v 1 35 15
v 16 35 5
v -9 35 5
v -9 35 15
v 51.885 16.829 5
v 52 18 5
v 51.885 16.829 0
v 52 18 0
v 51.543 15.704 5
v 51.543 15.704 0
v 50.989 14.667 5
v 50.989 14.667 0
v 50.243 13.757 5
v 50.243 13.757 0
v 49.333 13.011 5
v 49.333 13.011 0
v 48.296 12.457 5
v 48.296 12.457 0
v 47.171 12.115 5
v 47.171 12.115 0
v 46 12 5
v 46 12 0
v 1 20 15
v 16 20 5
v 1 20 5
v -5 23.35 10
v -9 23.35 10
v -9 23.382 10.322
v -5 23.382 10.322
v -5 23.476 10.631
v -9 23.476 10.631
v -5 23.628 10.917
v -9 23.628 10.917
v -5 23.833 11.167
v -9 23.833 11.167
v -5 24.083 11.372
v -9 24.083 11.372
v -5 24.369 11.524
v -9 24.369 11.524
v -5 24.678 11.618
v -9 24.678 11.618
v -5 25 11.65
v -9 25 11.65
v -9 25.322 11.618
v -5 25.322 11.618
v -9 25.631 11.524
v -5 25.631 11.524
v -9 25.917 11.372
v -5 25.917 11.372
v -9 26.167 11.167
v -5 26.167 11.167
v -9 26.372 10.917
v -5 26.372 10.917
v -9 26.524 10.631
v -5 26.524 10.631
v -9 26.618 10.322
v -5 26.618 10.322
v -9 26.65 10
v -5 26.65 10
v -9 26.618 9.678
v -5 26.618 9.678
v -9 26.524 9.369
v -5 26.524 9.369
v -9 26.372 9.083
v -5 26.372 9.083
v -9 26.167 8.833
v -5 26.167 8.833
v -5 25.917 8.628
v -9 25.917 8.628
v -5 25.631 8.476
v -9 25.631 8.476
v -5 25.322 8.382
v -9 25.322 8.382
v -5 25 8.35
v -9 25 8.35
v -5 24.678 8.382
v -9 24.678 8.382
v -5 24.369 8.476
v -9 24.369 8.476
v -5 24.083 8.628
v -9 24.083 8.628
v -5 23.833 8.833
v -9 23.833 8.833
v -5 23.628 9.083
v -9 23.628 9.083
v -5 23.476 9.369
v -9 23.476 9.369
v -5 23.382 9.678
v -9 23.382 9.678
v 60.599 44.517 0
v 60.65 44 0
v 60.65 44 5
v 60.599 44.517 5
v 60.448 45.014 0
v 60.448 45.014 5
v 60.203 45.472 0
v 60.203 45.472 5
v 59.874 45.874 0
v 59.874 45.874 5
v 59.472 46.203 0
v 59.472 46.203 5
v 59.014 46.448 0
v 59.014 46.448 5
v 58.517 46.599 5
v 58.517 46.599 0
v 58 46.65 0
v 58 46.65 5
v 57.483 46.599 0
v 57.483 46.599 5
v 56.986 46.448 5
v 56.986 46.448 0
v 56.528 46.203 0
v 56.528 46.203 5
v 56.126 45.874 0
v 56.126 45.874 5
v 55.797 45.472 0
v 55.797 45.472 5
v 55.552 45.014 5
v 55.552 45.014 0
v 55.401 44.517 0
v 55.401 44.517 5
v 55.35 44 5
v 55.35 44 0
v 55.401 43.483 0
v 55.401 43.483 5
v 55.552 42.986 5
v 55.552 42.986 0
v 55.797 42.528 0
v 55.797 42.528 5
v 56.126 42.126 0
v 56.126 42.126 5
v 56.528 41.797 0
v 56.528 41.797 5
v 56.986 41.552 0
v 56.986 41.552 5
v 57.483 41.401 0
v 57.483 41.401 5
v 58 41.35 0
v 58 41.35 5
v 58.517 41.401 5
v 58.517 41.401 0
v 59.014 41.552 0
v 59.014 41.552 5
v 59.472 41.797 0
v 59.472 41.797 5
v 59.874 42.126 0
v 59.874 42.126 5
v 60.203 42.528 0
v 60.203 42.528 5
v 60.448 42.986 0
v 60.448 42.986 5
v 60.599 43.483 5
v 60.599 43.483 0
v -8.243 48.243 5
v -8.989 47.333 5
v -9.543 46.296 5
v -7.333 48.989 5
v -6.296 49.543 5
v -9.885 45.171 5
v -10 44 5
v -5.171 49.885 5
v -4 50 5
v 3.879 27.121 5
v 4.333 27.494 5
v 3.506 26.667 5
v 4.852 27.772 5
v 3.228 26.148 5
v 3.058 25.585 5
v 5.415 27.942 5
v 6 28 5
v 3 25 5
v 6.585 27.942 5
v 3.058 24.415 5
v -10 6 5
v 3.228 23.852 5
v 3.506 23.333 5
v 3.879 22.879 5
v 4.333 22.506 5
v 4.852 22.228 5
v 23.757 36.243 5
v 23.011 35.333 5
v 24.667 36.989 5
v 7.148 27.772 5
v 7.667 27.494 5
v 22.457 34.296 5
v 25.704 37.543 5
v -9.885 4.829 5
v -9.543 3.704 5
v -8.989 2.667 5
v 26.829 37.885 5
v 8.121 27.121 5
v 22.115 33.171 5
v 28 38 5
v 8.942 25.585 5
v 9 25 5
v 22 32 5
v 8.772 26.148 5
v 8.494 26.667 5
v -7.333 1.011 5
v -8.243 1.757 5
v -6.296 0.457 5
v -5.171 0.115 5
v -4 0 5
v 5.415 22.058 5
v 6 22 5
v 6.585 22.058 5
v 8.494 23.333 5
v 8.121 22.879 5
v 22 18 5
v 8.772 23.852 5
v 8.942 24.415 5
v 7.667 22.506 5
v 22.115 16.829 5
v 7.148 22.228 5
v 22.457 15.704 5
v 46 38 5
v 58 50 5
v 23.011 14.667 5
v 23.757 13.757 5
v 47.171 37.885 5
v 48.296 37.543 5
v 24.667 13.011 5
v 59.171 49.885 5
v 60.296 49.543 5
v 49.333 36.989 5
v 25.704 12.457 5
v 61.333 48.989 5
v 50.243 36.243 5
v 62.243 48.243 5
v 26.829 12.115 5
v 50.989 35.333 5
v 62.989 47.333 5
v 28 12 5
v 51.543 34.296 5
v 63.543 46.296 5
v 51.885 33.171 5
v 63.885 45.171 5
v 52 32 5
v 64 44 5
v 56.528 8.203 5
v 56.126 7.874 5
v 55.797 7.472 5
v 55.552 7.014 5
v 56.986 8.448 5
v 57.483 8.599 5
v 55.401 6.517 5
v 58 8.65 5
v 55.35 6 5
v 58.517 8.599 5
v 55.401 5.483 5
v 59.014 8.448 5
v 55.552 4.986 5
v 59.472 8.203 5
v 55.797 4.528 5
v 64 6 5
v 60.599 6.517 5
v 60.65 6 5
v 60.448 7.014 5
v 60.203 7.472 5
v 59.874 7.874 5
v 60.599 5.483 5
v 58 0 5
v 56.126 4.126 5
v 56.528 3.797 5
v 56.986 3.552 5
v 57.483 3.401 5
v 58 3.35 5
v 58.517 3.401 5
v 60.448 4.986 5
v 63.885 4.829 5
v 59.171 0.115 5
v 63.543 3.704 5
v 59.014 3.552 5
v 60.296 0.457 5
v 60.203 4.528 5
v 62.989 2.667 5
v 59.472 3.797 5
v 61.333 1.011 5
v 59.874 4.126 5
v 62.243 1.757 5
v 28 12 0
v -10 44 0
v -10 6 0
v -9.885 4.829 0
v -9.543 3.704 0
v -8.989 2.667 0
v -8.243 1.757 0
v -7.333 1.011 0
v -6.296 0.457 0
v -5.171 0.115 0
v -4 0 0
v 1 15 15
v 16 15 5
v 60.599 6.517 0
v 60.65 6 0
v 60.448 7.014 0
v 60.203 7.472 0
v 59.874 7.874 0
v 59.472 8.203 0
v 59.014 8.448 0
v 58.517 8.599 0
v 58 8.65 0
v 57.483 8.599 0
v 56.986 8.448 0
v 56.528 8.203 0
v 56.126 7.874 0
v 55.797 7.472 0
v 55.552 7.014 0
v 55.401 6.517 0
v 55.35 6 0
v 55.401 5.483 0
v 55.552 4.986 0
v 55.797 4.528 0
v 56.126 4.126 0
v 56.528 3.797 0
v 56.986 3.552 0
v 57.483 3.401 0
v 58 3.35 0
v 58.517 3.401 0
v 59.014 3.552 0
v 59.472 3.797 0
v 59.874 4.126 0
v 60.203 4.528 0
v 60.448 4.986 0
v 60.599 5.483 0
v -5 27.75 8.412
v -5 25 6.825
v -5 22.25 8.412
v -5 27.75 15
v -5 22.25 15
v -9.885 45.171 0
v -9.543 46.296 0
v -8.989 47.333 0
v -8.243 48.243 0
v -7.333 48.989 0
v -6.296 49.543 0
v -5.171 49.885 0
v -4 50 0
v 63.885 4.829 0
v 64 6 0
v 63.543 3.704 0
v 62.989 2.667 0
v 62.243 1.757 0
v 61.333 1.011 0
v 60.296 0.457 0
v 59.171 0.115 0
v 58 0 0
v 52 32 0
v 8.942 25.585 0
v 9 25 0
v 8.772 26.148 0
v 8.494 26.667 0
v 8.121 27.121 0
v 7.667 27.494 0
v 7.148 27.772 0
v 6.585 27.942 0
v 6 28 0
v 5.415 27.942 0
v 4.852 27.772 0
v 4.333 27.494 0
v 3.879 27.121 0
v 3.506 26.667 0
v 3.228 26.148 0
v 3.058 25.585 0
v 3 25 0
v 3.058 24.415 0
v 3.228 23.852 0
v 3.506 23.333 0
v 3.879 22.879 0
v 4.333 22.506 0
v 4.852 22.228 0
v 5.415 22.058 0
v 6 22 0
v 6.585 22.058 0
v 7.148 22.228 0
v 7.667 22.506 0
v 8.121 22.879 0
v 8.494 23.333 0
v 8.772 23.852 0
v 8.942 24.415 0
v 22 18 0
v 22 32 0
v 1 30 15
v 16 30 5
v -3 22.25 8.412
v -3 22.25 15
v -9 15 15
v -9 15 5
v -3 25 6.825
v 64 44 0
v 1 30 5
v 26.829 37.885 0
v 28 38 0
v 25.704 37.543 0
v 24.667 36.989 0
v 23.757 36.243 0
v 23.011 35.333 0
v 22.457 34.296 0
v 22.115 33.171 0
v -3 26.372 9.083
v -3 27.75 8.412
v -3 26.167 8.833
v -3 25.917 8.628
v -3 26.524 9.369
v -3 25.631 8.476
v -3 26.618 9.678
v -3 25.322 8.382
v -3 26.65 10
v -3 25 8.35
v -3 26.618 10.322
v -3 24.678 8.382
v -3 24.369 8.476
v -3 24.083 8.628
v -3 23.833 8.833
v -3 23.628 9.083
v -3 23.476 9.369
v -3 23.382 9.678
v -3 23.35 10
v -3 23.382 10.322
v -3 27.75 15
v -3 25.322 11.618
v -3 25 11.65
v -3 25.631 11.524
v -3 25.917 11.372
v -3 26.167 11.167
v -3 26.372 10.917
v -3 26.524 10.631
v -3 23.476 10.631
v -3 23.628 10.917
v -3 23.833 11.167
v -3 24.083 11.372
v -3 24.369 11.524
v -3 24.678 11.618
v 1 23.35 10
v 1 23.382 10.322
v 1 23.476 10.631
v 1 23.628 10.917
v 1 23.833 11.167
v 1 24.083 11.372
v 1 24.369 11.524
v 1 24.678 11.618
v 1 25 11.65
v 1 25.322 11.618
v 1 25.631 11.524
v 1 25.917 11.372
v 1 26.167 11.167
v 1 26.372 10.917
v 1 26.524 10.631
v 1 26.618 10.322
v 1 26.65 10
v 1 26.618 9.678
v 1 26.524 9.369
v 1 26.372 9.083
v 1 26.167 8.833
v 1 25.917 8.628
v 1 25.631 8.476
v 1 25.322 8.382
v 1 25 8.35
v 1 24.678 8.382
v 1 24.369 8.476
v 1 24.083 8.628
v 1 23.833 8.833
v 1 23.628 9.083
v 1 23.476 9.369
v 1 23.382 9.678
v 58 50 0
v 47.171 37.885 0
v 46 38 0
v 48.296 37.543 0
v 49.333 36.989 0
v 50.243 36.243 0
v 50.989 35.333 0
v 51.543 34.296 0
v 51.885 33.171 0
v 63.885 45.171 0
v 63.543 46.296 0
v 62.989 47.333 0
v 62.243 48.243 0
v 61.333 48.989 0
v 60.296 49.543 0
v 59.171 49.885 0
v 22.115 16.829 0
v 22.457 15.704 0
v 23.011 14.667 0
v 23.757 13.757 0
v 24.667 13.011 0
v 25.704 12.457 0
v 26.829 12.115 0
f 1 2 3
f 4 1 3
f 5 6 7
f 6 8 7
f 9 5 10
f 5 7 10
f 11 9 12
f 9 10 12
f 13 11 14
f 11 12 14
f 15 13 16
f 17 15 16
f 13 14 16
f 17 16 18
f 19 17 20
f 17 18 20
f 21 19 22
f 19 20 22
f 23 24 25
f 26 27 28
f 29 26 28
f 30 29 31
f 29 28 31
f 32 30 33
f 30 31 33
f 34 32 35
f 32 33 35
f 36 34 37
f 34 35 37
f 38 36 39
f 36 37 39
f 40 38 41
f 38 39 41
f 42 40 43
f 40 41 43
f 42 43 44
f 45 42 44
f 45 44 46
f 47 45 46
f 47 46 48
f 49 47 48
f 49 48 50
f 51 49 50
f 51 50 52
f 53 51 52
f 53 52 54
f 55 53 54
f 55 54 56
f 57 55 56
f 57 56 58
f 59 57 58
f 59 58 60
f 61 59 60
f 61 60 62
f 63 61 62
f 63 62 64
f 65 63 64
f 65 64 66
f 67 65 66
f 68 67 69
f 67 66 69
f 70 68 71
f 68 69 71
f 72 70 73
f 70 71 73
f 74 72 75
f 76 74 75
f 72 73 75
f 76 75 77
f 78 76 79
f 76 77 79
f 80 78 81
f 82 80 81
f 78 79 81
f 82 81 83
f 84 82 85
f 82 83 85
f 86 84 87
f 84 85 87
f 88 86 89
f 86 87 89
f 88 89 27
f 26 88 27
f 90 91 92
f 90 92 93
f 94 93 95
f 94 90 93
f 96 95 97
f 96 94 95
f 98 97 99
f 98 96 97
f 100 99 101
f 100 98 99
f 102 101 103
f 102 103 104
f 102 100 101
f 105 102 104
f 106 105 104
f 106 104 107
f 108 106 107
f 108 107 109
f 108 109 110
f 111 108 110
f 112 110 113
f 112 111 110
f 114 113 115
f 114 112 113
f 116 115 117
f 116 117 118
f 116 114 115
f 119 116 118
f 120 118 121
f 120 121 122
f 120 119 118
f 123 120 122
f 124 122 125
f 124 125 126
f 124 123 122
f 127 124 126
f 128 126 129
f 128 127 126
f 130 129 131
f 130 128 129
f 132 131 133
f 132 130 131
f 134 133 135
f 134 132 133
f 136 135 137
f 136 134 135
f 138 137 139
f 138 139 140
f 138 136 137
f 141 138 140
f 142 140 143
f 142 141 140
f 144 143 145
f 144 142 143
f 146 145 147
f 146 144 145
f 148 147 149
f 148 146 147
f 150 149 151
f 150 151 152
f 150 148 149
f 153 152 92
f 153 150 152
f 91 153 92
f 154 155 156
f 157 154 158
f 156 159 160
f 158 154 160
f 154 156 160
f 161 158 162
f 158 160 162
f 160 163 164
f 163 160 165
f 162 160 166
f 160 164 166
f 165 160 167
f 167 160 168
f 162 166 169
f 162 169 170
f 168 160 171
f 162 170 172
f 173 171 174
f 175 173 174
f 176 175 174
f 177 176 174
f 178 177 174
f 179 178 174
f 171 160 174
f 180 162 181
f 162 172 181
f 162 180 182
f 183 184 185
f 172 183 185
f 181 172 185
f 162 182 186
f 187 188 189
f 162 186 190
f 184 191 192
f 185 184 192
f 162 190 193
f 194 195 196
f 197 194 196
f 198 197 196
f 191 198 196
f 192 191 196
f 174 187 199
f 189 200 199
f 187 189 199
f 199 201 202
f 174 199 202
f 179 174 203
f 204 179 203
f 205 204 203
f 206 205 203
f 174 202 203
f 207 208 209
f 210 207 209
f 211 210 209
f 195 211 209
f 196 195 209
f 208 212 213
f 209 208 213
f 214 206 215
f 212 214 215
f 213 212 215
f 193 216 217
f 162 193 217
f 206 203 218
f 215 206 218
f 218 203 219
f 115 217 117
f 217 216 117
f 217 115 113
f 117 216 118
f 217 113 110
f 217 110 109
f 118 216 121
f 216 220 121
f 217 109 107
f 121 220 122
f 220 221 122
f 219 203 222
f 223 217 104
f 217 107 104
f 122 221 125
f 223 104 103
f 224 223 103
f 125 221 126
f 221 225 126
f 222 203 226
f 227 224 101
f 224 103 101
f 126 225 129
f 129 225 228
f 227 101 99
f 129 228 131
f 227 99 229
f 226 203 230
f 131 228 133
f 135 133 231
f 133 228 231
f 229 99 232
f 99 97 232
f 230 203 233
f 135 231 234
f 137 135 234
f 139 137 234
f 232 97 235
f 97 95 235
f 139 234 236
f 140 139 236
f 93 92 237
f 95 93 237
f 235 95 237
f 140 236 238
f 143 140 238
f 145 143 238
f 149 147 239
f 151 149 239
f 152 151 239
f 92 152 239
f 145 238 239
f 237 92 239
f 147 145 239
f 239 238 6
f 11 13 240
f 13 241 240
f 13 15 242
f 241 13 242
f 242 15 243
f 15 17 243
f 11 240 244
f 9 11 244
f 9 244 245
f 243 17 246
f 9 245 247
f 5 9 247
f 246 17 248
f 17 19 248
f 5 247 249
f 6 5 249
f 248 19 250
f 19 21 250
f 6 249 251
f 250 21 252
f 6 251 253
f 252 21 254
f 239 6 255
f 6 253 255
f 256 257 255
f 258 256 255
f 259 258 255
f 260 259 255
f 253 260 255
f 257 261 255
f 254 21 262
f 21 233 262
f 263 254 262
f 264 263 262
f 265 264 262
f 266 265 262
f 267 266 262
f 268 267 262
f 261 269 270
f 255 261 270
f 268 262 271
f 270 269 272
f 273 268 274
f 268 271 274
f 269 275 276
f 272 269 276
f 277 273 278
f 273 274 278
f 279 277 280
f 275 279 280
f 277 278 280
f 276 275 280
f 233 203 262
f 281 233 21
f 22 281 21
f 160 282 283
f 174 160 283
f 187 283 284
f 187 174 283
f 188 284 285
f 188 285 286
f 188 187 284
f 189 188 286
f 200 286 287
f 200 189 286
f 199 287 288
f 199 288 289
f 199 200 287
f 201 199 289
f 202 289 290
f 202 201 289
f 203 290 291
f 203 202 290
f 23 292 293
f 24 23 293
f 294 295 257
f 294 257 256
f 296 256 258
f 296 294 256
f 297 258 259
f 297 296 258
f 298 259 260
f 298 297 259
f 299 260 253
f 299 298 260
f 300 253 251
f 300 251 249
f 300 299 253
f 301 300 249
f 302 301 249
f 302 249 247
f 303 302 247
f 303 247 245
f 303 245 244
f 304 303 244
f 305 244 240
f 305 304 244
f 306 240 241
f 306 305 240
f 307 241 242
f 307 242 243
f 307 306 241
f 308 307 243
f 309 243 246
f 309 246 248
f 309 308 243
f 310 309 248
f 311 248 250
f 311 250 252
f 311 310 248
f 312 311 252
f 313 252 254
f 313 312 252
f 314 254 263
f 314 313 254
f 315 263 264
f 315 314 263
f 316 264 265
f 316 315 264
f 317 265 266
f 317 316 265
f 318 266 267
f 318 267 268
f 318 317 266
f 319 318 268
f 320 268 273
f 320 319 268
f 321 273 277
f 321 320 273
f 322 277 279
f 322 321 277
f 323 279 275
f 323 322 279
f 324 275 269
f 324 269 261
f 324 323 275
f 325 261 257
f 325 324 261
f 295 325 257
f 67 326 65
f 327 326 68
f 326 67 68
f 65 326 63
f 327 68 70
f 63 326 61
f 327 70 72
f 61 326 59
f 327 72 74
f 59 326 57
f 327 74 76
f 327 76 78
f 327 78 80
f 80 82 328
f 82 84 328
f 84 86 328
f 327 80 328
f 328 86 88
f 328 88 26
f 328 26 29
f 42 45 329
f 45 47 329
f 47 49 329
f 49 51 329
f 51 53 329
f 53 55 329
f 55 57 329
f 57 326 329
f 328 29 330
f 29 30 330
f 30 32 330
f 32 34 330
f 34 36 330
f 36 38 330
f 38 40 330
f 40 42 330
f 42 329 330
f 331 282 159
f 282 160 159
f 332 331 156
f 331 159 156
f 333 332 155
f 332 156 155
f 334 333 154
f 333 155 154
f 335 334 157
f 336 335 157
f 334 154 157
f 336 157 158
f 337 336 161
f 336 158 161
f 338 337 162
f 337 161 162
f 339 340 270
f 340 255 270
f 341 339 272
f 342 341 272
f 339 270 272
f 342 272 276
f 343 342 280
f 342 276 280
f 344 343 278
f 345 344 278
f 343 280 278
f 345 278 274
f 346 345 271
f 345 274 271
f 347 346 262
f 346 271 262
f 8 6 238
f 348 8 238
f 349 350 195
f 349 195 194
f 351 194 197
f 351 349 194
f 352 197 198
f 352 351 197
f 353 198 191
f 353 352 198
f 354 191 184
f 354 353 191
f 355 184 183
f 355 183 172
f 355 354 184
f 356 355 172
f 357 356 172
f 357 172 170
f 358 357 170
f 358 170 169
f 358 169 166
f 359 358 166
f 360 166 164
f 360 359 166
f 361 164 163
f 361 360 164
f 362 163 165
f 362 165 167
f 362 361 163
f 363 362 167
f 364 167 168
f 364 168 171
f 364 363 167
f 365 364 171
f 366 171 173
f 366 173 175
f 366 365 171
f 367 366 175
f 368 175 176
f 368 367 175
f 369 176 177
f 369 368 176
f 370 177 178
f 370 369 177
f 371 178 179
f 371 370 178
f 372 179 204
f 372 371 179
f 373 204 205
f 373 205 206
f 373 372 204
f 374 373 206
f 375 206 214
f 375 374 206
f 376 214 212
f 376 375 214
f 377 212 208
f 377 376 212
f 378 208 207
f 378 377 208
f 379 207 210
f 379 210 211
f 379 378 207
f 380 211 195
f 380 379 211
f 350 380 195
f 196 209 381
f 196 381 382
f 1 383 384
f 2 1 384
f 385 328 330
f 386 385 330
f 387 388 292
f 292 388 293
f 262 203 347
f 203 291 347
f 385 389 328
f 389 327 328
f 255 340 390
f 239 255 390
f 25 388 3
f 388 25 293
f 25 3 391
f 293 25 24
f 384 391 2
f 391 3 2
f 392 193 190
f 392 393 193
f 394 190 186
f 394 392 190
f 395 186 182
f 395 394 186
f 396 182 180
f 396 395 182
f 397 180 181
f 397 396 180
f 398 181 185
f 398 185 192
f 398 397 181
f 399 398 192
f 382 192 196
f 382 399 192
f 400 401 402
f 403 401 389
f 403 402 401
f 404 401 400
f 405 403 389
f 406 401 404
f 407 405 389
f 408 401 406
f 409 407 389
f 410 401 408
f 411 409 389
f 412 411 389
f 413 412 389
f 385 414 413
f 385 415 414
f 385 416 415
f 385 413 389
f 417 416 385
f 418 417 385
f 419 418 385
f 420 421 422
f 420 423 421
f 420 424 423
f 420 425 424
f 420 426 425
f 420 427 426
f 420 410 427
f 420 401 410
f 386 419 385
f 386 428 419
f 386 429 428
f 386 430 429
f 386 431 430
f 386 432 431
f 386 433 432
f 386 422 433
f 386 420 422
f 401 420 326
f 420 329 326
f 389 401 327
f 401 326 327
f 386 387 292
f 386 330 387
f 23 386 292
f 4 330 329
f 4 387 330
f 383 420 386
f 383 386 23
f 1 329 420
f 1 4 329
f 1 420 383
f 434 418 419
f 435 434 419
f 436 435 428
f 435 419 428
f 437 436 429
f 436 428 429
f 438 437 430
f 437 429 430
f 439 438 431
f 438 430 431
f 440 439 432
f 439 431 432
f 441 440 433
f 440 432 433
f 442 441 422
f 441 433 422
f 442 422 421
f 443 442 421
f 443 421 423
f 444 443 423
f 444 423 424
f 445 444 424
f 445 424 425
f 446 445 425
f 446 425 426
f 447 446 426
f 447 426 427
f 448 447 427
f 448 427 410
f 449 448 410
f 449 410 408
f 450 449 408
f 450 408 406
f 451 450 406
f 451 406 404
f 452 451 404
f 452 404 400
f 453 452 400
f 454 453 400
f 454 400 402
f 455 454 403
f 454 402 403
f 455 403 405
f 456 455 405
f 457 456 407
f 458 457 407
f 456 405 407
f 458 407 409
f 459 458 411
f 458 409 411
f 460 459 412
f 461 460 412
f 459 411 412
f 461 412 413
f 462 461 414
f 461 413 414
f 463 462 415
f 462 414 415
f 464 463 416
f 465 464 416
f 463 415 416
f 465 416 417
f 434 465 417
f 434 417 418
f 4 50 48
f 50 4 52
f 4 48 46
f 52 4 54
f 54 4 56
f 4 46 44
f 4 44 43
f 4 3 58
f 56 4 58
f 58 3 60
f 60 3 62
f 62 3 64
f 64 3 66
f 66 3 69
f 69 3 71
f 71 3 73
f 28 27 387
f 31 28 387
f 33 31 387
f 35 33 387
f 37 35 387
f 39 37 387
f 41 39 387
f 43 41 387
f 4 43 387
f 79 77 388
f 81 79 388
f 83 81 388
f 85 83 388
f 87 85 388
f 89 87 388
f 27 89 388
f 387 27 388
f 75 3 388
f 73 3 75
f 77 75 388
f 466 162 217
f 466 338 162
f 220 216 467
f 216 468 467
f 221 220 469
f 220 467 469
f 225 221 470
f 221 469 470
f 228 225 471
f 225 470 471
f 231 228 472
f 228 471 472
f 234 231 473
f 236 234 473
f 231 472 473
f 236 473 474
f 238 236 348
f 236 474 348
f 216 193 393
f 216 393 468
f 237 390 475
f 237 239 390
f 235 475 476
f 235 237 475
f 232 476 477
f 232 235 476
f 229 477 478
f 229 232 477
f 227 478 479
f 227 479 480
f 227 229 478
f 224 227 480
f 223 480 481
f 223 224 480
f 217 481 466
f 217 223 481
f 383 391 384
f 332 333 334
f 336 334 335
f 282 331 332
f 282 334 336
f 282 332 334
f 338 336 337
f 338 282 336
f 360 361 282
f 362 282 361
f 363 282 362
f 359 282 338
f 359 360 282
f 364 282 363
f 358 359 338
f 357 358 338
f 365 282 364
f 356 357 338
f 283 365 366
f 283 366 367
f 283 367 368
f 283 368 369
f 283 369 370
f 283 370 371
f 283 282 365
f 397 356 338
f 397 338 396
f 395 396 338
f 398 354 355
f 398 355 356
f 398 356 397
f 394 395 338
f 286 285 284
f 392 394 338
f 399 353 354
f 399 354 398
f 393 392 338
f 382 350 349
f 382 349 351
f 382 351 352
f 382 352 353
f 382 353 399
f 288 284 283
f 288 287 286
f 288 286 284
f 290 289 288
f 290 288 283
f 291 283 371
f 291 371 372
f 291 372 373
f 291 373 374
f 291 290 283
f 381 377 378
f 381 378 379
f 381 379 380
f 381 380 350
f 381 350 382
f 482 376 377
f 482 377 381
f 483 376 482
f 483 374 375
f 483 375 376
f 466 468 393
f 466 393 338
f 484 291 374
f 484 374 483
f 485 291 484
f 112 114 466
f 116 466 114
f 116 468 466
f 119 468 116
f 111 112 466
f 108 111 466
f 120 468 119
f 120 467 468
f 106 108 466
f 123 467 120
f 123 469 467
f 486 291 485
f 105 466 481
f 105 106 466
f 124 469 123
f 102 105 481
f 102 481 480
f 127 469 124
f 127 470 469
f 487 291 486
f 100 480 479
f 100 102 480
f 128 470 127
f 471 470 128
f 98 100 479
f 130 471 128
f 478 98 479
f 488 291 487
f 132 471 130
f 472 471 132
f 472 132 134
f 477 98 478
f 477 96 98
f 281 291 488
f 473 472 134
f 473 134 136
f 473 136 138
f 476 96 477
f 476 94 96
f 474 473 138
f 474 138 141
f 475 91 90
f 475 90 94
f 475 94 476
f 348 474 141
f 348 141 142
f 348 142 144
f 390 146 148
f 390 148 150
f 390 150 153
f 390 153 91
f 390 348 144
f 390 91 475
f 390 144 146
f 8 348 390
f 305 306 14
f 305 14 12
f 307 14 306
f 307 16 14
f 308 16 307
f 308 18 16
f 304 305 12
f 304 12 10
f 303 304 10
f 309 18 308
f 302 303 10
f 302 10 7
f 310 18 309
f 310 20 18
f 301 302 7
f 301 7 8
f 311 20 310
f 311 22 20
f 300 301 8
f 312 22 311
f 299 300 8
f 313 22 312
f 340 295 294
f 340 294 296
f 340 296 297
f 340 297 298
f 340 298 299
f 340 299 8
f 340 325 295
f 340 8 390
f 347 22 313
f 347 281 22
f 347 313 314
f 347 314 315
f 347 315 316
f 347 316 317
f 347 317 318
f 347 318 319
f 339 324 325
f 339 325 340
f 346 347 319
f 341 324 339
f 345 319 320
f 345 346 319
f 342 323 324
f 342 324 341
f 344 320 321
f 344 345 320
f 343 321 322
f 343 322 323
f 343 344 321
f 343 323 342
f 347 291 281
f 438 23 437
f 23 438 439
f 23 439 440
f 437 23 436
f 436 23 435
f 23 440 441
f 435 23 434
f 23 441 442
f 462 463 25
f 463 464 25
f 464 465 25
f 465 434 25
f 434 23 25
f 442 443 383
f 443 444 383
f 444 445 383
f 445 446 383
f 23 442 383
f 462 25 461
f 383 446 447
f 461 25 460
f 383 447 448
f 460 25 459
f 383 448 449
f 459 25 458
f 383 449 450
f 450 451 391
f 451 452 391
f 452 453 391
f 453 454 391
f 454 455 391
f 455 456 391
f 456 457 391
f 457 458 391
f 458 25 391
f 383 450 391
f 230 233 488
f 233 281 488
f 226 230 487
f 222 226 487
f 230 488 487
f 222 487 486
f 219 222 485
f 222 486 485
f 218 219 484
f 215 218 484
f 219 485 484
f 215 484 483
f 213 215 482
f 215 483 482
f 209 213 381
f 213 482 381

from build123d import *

# Parameters (mm, degrees)
F0_W      = 64
F0_H      = 50
F0_R      = 2.65
F0_R_2    = 3
F1_DEPTH  = 5
F2_W      = 10
F2_H      = 50
F3_DEPTH  = 5
F8_DEPTH  = 10
F10_DEPTH = 35.001
F11_R     = 1.65
F12_DEPTH = 73.001
F15_DEPTH = 1
F16_R     = 6
F17_W     = 30
F17_H     = 26
F18_DEPTH = 5.001
F19_R     = 6


# Not quite as in the source:
# - a feature names something its author has since deleted; it is built from what else it names


with BuildPart() as f1:
    # F0 (on Top) → F1 (new body)
    with BuildSketch(Plane.XY):
        with Locations((32, 25)):
            Rectangle(F0_W, F0_H)
        with Locations((58, 6)):
            Circle(F0_R, mode=Mode.SUBTRACT)
        with Locations((6, 25)):
            Circle(F0_R_2, mode=Mode.SUBTRACT)
        with Locations((58, 44)):
            Circle(F0_R, mode=Mode.SUBTRACT)
    extrude(amount=F1_DEPTH)

    # F2 (on face) → F3 (join, through all)
    with BuildSketch(Plane(origin=(0, 0, 0), x_dir=(1, 0, 0), z_dir=(0, 0, -1))):
        with Locations((-5, -25)):
            Rectangle(F2_W, F2_H)
    extrude(amount=-F3_DEPTH)

    # F16
    f16_edges = [f1.edges().sort_by_distance(p)[0] for p in [
        (64, 50, 2.5),
        (64, 0, 2.5),
        (-10, 0, 2.5),
        (-10, 50, 2.5),
    ]]
    fillet(f16_edges, radius=F16_R)

    # F17 (on face) → F18 (cut, through all)
    with BuildSketch(Plane.XY.offset(5)):
        with Locations((37, 25)):
            Rectangle(F17_W, F17_H)
    extrude(amount=-F18_DEPTH, mode=Mode.SUBTRACT)

    # F19
    f19_edges = [f1.edges().sort_by_distance(p)[0] for p in [
        (22, 38, 2.5),
        (52, 38, 2.5),
        (52, 12, 2.5),
        (22, 12, 2.5),
    ]]
    fillet(f19_edges, radius=F19_R)


with BuildPart() as f8:
    # F7 (on face) → F8 (new body)
    with BuildSketch(Plane.XY.offset(5)):
        Polygon((16, 35), (-9, 35), (-9, 15), (16, 15), (16, 20), (1, 20), (1, 30), (16, 30), align=None)
    extrude(amount=F8_DEPTH)

    # F9 (on face) → F10 (cut, through all)
    with BuildSketch(Plane.XZ.offset(-15)):
        Polygon((16, 15), (1, 15), (16, 5), align=None)
    extrude(amount=-F10_DEPTH, mode=Mode.SUBTRACT)

    # F11 (on face) → F12 (cut, through all)
    with BuildSketch(Plane(origin=(-9, 0, 0), x_dir=(0, -1, 0), z_dir=(-1, 0, 0))):
        with Locations((-25, 10)):
            Circle(F11_R)
    extrude(amount=-F12_DEPTH, mode=Mode.SUBTRACT)

    # F14 (on offset) → F15 (cut, symmetric)
    with BuildSketch(Plane(origin=(-4, 0, 0), x_dir=(0, -1, 0), z_dir=(-1, 0, 0))):
        Polygon((-25, 6.8245735195), (-22.25, 8.4122867597), (-22.25, 15), (-27.75, 15), (-27.75, 8.4122867597), align=None)
    extrude(amount=F15_DEPTH, both=True, mode=Mode.SUBTRACT)


solid = Compound([f1.part, f8.part])
